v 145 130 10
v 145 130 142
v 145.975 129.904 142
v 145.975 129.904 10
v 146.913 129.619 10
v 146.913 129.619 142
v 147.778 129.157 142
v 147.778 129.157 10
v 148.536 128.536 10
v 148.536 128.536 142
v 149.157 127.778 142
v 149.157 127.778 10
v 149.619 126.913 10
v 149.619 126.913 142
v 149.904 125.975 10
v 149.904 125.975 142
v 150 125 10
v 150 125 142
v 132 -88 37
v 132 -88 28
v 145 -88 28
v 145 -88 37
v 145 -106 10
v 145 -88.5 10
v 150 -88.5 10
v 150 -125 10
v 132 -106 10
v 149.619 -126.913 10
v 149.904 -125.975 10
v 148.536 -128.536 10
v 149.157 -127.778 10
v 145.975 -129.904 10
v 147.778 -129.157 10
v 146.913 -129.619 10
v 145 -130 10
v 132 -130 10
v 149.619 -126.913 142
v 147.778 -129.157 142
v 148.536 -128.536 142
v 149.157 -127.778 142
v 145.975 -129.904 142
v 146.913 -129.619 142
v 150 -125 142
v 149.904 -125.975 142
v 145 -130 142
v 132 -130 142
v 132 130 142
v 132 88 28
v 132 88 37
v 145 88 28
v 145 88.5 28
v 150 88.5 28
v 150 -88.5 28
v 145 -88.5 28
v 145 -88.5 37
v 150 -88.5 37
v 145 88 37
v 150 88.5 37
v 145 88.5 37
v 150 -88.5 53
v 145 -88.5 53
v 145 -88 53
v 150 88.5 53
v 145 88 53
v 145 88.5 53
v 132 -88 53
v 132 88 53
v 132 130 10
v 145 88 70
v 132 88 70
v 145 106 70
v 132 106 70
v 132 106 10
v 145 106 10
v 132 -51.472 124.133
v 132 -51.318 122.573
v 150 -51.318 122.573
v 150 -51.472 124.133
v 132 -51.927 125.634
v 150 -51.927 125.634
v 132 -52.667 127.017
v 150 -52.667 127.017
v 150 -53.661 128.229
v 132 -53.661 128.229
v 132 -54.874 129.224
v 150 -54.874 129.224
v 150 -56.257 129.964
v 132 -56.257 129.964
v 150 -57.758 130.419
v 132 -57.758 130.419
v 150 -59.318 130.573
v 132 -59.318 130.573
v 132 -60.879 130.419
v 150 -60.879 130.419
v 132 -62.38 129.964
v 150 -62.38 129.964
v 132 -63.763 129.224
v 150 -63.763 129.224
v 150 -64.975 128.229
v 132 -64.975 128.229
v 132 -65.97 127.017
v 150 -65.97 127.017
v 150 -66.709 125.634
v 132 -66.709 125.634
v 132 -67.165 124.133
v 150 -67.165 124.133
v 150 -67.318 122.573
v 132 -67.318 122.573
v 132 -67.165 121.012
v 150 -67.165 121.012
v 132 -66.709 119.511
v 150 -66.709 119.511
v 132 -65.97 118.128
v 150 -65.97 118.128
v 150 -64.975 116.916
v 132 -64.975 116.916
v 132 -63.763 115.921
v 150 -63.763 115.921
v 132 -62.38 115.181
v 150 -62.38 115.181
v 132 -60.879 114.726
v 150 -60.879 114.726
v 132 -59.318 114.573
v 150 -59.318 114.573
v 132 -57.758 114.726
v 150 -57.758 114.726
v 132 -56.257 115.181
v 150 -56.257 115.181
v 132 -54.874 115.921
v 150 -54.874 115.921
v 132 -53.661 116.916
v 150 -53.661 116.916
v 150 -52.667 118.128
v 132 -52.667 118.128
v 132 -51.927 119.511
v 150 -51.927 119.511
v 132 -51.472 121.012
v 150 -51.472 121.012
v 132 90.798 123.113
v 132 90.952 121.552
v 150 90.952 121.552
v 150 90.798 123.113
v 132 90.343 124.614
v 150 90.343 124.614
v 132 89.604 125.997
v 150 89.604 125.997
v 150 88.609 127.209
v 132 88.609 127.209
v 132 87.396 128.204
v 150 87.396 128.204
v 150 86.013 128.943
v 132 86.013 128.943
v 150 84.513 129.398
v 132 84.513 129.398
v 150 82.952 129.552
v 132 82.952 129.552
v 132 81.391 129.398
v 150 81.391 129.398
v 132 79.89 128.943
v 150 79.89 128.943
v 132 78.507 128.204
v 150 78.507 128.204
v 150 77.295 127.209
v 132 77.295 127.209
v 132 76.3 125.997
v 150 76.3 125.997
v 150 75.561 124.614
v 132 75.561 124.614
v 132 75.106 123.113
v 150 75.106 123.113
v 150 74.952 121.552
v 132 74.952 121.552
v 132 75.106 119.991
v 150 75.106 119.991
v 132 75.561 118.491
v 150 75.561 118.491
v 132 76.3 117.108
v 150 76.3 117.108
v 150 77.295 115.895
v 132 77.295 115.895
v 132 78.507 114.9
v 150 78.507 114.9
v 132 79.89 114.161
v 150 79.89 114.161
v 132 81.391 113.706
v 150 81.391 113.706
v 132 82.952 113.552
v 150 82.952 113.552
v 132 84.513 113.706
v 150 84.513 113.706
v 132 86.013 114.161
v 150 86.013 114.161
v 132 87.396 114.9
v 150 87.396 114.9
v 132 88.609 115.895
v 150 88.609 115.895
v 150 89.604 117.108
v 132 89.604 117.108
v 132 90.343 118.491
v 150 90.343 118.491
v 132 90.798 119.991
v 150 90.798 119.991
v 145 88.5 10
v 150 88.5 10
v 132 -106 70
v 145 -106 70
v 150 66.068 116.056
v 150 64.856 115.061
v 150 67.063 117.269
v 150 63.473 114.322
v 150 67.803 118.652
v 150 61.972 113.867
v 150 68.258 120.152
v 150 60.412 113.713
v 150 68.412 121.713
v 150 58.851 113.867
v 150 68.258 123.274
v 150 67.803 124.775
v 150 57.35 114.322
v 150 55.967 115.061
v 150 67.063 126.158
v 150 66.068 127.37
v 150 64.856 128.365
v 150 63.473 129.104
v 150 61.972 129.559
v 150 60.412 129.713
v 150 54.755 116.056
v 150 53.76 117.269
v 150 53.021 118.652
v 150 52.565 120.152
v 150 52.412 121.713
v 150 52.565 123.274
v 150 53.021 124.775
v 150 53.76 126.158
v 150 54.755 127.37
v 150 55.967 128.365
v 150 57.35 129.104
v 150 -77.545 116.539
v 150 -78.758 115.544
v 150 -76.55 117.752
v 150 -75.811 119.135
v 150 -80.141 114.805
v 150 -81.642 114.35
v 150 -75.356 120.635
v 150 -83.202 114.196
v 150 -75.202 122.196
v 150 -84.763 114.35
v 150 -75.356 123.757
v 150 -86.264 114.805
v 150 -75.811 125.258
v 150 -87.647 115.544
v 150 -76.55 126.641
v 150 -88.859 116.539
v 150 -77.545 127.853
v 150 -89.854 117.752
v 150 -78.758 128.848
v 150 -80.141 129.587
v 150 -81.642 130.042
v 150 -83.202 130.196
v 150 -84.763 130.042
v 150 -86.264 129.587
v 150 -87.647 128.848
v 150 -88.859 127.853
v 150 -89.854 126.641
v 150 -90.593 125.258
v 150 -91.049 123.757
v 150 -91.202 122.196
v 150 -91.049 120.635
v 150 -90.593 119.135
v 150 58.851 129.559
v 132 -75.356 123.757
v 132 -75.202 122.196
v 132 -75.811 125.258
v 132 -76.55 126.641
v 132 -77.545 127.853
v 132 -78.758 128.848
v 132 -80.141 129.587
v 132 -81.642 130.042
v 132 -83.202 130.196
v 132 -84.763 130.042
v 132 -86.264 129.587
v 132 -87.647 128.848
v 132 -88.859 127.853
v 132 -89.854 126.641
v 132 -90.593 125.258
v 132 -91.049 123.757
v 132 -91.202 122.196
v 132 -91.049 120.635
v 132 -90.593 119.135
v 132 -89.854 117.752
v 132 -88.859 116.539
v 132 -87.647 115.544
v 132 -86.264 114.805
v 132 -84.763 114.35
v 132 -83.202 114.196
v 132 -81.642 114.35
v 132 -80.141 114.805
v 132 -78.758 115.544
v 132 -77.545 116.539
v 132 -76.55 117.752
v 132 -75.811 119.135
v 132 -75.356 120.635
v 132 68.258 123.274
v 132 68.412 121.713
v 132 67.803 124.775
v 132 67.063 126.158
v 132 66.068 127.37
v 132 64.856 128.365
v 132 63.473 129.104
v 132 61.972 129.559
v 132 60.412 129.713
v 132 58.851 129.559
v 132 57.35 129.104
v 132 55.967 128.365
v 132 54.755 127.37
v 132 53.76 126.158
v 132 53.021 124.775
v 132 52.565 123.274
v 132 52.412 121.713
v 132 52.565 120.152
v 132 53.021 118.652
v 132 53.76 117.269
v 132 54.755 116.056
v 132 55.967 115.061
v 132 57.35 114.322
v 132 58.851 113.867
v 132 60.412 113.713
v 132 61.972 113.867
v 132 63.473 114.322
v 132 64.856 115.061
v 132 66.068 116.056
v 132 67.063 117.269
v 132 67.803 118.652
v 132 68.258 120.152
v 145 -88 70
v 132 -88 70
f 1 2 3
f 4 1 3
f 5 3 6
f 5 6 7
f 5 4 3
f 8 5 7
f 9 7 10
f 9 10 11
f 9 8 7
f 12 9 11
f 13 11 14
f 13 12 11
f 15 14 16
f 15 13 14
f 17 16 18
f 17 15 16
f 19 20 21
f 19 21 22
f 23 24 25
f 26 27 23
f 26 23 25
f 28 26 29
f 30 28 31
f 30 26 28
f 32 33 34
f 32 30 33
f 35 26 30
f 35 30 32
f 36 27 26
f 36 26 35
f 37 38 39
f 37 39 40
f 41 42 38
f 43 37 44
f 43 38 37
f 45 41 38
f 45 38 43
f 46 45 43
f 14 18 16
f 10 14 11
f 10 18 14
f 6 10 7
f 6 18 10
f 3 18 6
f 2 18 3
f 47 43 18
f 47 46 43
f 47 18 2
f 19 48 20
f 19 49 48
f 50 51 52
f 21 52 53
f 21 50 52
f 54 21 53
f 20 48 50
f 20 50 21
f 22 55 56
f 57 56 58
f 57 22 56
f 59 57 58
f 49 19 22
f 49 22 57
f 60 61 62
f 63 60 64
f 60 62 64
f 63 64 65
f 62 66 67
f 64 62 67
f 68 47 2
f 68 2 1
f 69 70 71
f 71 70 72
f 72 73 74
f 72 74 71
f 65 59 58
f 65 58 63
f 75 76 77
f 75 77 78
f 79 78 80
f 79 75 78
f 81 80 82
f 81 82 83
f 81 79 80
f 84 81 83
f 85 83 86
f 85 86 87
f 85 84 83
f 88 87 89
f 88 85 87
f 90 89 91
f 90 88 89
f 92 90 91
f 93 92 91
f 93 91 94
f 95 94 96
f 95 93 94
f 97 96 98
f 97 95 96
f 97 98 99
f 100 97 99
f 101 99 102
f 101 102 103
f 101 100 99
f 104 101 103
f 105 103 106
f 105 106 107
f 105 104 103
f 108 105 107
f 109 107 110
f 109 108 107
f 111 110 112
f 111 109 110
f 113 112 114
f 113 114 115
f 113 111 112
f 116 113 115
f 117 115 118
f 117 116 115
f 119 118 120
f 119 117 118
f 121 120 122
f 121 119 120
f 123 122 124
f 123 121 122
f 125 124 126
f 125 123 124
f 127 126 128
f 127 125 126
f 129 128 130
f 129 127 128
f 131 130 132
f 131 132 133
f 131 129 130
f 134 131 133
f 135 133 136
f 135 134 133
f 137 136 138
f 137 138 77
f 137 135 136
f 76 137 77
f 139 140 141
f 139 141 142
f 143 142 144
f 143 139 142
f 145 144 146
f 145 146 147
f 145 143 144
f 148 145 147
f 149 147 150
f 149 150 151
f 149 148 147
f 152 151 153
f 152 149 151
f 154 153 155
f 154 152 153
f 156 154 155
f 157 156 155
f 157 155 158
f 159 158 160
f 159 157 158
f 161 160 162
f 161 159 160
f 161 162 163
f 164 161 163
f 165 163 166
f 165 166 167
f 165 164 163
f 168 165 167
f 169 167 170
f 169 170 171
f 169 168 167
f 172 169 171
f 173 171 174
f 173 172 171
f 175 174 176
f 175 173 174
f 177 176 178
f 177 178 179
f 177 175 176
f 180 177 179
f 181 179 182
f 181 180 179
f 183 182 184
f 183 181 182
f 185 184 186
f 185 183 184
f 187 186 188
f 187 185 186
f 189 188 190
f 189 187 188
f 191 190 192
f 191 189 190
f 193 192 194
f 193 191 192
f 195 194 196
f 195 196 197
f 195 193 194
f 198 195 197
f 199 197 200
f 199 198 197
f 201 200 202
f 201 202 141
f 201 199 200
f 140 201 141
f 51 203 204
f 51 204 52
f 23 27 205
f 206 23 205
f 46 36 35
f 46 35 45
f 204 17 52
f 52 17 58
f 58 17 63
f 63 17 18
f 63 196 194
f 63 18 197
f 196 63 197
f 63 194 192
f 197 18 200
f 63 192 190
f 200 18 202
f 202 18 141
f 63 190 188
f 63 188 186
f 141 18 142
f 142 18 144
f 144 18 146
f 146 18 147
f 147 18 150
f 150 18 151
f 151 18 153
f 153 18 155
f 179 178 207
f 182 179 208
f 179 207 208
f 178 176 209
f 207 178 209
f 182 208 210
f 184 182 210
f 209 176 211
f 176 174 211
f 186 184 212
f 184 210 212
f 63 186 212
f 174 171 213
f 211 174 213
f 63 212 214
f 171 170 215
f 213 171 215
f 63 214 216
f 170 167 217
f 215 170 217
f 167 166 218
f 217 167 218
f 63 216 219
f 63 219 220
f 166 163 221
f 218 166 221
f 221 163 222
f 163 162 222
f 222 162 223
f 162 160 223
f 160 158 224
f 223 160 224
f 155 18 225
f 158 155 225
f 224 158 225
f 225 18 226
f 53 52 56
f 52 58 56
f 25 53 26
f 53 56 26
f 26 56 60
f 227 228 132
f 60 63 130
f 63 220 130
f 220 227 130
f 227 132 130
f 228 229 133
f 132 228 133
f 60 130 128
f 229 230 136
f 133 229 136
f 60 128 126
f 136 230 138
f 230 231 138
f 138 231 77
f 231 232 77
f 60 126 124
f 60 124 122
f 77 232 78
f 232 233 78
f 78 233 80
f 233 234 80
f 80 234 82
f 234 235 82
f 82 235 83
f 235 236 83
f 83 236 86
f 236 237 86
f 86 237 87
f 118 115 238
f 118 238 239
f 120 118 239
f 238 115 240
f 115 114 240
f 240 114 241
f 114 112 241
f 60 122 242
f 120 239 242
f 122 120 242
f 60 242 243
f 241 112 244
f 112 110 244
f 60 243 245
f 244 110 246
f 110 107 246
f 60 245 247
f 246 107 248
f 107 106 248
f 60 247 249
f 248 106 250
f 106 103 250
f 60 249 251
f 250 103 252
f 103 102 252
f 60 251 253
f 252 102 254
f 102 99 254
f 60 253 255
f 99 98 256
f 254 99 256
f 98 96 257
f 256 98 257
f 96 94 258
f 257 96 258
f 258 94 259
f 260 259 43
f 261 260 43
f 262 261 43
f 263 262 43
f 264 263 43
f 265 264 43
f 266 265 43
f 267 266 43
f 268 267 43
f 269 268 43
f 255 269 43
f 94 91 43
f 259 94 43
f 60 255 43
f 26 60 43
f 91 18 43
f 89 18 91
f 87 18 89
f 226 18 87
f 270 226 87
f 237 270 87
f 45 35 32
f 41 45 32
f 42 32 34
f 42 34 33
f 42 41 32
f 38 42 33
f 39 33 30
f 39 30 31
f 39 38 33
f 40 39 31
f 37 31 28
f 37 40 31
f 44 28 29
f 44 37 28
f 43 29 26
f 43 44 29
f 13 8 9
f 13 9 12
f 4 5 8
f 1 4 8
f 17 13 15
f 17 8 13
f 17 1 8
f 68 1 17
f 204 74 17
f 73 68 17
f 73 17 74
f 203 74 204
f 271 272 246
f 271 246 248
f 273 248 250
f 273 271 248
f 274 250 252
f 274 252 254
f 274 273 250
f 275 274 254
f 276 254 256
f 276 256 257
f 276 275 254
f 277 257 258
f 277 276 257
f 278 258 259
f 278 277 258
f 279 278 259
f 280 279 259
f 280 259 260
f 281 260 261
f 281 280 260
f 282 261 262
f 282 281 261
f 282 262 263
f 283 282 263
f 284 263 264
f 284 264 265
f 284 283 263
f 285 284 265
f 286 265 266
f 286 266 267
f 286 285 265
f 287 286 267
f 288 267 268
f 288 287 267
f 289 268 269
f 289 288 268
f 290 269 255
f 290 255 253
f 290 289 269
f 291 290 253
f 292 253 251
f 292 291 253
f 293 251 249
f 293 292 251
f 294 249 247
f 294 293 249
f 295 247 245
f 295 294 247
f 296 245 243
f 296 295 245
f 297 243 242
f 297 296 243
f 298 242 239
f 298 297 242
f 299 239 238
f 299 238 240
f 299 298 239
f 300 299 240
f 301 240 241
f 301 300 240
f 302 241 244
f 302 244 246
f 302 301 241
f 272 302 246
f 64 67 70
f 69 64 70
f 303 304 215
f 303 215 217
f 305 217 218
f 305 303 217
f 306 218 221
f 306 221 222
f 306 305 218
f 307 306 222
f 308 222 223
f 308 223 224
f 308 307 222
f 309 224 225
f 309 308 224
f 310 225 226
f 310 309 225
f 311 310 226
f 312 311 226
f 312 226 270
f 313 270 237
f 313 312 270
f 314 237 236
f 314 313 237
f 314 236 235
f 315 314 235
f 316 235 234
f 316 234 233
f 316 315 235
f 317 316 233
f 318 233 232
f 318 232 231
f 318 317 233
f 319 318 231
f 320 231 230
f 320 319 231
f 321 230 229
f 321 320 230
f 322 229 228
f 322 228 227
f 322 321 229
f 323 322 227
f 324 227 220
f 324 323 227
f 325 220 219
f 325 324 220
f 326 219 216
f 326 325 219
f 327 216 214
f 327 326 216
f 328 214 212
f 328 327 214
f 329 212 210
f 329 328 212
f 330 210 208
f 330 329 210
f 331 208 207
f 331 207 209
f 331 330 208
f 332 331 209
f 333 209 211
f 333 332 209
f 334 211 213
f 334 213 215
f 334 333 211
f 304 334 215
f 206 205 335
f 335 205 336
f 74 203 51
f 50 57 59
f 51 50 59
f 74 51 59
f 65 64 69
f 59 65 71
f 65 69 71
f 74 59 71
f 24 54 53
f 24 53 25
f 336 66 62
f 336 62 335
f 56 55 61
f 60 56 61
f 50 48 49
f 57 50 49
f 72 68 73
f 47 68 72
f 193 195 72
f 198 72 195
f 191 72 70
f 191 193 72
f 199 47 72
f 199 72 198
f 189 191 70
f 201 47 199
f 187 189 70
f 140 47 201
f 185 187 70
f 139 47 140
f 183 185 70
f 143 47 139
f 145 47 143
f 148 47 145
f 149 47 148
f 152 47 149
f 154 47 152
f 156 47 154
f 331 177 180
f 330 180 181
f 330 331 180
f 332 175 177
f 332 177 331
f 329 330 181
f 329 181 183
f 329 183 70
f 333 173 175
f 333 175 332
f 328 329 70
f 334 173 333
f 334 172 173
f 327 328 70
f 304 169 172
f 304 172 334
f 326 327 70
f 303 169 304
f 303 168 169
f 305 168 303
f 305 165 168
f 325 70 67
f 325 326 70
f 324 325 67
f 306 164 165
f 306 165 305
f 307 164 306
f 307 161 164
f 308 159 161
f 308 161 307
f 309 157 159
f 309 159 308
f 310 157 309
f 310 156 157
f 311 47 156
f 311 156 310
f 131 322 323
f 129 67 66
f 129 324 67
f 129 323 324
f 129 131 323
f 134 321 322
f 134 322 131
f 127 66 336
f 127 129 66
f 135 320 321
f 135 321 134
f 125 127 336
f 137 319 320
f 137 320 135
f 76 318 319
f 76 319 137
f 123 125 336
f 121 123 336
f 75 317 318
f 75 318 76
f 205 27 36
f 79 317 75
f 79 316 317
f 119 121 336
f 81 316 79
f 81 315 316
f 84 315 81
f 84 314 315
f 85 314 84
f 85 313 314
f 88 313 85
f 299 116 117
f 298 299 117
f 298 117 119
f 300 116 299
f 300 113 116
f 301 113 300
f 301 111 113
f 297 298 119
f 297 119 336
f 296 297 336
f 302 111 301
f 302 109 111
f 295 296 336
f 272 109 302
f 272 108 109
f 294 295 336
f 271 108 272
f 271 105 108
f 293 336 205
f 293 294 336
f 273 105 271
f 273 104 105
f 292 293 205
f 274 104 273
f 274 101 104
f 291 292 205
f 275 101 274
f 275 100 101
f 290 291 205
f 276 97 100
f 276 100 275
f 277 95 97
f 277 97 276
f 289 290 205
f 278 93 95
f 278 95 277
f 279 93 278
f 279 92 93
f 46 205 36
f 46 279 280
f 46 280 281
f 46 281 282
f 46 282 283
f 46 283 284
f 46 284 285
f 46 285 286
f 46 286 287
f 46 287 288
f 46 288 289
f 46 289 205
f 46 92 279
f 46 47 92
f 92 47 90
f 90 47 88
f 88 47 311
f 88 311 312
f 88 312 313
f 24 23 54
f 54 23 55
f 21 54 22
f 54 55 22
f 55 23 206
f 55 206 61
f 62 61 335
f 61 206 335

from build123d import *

# Parameters (mm, degrees)
SKETCH002_W  = 177
SKETCH002_H  = 16
SKETCH002_R  = 8
PAD002_DEPTH = 18
FILLET_R     = 5
SKETCH_W     = 18
SKETCH_H     = 70
POCKET_DEPTH = 145


with BuildPart() as part:
    # Sketch002 → Pad002 (new body)
    with BuildSketch(Plane.YZ.offset(132)):
        Polygon((-130, 10), (-130, 142), (130, 142), (130, 10), (88.5, 10), (88.5, 28), (-88.5, 28), (-88.5, 10), align=None)
        with Locations((0, 45)):
            Rectangle(SKETCH002_W, SKETCH002_H, mode=Mode.SUBTRACT)
        with Locations((-83.20224, 122.196114)):
            Circle(SKETCH002_R, mode=Mode.SUBTRACT)
        with Locations((-59.318291, 122.57251)):
            Circle(SKETCH002_R, mode=Mode.SUBTRACT)
        with Locations((60.411636, 121.713104)):
            Circle(SKETCH002_R, mode=Mode.SUBTRACT)
        with Locations((82.951927, 121.552109)):
            Circle(SKETCH002_R, mode=Mode.SUBTRACT)
    extrude(amount=PAD002_DEPTH)

    # Fillet
    fillet_edges = [part.edges().sort_by_distance(p)[0] for p in [
        (150, -130, 76),
        (150, 130, 76),
    ]]
    fillet(fillet_edges, radius=FILLET_R)

    # Sketch → Pocket (cut)
    with BuildSketch(Plane.YZ):
        with Locations((-97, 35)):
            Rectangle(SKETCH_W, SKETCH_H)
        with Locations((97, 35)):
            Rectangle(SKETCH_W, SKETCH_H)
    extrude(amount=POCKET_DEPTH, mode=Mode.SUBTRACT)


solid = part.part
